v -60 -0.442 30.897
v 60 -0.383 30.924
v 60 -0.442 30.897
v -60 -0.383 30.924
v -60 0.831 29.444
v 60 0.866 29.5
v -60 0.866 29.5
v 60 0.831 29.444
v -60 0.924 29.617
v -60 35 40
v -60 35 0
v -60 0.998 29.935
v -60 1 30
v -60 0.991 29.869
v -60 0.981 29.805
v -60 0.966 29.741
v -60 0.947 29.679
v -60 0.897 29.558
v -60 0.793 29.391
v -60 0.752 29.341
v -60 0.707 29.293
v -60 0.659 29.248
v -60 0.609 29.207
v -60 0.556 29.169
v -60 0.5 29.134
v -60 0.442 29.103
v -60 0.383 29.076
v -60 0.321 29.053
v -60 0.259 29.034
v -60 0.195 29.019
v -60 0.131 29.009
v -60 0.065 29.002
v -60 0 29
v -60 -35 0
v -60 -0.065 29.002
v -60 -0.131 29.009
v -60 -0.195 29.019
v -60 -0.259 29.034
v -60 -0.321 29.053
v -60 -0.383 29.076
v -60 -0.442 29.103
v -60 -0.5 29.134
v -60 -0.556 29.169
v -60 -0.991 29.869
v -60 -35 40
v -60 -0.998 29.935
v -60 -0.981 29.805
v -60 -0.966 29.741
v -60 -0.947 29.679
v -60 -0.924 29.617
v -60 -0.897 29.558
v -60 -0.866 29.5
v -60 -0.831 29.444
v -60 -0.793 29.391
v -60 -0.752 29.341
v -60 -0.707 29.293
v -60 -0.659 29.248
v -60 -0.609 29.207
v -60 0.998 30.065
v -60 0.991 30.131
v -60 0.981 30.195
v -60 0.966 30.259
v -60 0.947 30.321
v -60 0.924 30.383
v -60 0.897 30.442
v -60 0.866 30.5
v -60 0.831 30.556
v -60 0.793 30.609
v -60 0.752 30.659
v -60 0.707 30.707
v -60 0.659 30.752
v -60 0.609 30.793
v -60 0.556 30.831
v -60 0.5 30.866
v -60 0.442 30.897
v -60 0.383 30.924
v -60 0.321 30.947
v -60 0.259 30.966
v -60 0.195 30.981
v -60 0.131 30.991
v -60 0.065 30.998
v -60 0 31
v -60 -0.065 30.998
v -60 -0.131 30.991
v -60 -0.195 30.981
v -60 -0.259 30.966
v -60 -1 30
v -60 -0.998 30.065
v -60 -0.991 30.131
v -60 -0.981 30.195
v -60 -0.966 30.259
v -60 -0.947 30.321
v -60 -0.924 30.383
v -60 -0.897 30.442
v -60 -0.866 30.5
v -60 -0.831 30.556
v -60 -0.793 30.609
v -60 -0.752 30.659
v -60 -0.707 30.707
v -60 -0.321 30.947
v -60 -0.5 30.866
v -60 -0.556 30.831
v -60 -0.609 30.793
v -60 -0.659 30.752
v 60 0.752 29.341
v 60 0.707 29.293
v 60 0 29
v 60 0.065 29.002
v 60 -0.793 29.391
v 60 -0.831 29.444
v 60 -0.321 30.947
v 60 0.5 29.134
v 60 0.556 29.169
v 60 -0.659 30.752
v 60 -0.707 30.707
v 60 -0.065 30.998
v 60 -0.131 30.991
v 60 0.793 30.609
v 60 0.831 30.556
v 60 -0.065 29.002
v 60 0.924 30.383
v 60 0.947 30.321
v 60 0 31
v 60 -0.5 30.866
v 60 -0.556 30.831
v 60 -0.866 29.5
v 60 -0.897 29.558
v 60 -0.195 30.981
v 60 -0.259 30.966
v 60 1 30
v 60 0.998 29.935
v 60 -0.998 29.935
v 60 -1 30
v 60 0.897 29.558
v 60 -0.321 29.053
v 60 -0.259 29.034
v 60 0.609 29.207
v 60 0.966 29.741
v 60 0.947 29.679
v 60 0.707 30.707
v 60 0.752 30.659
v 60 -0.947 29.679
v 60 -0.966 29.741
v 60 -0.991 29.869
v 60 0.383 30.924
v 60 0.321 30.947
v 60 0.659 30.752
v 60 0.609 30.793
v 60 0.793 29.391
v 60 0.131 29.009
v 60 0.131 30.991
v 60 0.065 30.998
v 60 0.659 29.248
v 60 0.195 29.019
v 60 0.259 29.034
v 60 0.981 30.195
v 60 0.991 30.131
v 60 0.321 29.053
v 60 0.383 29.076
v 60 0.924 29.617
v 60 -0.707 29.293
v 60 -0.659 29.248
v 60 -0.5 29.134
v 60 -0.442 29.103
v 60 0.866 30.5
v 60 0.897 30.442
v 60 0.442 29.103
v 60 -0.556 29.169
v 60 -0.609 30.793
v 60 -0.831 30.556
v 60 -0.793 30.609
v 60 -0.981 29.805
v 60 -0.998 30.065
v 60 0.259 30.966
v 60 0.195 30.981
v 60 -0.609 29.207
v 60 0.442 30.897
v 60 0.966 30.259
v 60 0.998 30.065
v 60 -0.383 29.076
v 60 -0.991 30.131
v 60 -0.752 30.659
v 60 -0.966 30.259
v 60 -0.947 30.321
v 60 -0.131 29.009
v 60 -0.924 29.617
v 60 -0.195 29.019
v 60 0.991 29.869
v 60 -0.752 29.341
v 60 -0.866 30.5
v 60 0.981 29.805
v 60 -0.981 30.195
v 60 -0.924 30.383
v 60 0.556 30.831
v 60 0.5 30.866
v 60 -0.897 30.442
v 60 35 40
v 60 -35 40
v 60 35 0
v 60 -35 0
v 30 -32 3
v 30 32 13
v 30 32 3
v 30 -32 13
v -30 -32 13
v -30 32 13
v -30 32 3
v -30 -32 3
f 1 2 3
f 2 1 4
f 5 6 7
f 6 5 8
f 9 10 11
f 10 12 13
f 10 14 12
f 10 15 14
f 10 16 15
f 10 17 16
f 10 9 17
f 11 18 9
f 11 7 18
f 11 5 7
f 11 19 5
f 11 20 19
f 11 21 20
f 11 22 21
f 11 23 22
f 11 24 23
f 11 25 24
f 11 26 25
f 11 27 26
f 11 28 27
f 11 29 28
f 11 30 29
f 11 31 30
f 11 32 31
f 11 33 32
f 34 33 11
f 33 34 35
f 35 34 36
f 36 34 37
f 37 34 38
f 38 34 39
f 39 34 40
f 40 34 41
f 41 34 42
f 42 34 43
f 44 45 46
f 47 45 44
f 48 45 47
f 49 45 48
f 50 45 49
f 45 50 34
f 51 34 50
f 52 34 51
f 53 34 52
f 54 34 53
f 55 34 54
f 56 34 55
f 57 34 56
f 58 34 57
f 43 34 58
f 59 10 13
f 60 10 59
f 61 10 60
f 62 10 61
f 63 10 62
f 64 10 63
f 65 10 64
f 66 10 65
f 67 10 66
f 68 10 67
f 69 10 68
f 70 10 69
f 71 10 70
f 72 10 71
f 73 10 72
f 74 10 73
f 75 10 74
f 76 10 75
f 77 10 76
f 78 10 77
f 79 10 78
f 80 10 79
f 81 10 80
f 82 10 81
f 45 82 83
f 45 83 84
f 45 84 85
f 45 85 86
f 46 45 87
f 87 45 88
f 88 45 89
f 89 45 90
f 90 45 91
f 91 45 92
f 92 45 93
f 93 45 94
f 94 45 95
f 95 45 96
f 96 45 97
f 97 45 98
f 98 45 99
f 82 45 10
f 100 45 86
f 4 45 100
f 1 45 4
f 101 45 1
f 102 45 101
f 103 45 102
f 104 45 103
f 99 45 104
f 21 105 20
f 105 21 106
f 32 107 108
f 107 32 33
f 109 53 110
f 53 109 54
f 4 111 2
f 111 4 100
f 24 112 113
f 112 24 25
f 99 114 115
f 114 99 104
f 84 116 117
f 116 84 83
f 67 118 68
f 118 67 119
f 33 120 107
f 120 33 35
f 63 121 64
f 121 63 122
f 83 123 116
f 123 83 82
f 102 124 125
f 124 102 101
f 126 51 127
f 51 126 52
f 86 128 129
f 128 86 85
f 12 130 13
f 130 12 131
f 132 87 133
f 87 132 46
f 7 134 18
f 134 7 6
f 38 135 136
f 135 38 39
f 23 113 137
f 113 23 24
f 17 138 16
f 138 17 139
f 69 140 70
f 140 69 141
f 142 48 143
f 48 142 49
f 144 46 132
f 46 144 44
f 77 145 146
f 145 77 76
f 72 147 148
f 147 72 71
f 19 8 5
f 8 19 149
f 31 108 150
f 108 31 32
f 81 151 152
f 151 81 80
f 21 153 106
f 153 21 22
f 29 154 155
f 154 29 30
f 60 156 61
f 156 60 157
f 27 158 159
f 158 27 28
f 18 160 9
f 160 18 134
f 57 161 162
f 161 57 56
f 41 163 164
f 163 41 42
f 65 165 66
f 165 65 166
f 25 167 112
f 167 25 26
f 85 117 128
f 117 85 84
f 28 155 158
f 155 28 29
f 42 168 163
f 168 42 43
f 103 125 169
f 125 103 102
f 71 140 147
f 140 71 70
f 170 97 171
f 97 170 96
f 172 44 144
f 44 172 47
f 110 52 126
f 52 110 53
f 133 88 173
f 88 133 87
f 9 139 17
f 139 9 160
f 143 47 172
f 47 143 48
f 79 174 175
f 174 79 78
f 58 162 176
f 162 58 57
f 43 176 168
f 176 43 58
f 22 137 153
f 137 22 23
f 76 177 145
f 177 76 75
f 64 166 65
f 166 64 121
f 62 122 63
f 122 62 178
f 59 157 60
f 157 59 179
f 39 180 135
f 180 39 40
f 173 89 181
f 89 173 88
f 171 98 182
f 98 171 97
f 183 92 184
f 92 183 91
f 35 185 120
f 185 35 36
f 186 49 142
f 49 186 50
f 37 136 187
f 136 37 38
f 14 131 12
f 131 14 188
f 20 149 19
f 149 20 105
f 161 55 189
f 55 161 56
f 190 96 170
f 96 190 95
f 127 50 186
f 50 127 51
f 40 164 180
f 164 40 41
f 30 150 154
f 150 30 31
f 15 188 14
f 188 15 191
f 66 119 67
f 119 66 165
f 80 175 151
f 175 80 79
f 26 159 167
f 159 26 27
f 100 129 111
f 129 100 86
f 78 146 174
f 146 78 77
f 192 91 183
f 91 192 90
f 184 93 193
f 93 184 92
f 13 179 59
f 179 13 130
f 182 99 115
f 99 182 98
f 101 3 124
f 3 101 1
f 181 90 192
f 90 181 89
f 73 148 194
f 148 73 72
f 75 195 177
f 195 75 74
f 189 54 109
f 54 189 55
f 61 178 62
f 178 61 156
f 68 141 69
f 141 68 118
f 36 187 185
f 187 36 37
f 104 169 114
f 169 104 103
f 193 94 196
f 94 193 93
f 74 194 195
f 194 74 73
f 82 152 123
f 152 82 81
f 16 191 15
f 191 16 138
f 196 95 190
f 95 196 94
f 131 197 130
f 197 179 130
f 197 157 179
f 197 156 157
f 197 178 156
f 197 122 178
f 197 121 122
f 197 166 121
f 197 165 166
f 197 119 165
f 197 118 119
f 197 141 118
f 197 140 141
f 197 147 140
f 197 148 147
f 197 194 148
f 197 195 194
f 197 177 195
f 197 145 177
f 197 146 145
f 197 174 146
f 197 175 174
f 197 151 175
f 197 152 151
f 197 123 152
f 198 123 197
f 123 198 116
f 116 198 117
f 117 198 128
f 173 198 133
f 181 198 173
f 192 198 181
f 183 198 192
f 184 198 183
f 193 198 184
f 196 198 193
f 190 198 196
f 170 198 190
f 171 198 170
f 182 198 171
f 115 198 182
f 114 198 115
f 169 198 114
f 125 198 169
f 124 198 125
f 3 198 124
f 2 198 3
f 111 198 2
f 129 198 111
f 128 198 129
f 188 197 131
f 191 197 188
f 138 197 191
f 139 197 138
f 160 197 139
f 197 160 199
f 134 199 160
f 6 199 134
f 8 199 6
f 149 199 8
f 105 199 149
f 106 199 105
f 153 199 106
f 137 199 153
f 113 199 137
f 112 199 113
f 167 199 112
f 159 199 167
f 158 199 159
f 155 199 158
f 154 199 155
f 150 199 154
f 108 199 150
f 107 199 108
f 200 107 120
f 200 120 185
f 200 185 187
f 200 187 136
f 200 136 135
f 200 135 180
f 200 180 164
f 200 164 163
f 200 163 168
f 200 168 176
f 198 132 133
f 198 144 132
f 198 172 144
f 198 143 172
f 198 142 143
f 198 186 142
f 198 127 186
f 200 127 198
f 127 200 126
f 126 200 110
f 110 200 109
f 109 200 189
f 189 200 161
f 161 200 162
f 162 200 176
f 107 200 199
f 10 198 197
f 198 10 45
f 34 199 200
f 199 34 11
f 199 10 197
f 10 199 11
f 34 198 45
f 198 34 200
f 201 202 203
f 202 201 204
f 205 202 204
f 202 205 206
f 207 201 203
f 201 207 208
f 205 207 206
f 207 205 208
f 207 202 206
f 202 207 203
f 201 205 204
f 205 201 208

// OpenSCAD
// Mini horizontal gel-electrophoresis box - buffer tank
// Print orientation: open top facing up (+Z), resting on XY plane at z = 0

// ---------------- Parameters ----------------
tank_x      = 120;   // outer length in X (mm)
tank_y      = 70;    // outer width in Y (mm)
tank_h      = 40;    // outer height in Z (mm)
wall        = 3;     // wall thickness (mm)
floor       = 3;     // floor thickness (mm)

platform_x  = 60;    // platform length in X (mm), centred
platform_y  = tank_y - 2 * wall;  // platform spans full inner width
platform_top = floor + 10;  // platform top height (z = 13)

hole_d      = 2;     // electrode hole diameter (mm)
hole_y      = 0;     // electrode hole Y position (mm)
hole_z      = 30;    // electrode hole Z position (mm)

eps         = 0.5;   // cutter overshoot past faces (mm)
$fn         = 96;    // curve resolution

// ---------------- Derived ----------------
inner_x = tank_x - 2 * wall;   // 114 mm
inner_z = tank_h - floor;      // 37 mm (floor at z = 0 to 3)

// ---------------- Model ----------------
difference() {
    // Main tank body
    translate([-tank_x / 2, -tank_y / 2, 0])
        cube([tank_x, tank_y, tank_h]);

    // Raised platform for gel tray
    translate([-platform_x / 2, -platform_y / 2, floor])
        cube([platform_x, platform_y, platform_top - floor]);

    // Horizontal electrode holes through each end wall, along X
    for (s = [-1, 1])
        translate([s > 0 ? tank_x / 2 - eps : -tank_x / 2, hole_y, hole_z])
            rotate([0, 90, 0])
                cylinder(d = hole_d, h = tank_x + 2 * eps);
}
